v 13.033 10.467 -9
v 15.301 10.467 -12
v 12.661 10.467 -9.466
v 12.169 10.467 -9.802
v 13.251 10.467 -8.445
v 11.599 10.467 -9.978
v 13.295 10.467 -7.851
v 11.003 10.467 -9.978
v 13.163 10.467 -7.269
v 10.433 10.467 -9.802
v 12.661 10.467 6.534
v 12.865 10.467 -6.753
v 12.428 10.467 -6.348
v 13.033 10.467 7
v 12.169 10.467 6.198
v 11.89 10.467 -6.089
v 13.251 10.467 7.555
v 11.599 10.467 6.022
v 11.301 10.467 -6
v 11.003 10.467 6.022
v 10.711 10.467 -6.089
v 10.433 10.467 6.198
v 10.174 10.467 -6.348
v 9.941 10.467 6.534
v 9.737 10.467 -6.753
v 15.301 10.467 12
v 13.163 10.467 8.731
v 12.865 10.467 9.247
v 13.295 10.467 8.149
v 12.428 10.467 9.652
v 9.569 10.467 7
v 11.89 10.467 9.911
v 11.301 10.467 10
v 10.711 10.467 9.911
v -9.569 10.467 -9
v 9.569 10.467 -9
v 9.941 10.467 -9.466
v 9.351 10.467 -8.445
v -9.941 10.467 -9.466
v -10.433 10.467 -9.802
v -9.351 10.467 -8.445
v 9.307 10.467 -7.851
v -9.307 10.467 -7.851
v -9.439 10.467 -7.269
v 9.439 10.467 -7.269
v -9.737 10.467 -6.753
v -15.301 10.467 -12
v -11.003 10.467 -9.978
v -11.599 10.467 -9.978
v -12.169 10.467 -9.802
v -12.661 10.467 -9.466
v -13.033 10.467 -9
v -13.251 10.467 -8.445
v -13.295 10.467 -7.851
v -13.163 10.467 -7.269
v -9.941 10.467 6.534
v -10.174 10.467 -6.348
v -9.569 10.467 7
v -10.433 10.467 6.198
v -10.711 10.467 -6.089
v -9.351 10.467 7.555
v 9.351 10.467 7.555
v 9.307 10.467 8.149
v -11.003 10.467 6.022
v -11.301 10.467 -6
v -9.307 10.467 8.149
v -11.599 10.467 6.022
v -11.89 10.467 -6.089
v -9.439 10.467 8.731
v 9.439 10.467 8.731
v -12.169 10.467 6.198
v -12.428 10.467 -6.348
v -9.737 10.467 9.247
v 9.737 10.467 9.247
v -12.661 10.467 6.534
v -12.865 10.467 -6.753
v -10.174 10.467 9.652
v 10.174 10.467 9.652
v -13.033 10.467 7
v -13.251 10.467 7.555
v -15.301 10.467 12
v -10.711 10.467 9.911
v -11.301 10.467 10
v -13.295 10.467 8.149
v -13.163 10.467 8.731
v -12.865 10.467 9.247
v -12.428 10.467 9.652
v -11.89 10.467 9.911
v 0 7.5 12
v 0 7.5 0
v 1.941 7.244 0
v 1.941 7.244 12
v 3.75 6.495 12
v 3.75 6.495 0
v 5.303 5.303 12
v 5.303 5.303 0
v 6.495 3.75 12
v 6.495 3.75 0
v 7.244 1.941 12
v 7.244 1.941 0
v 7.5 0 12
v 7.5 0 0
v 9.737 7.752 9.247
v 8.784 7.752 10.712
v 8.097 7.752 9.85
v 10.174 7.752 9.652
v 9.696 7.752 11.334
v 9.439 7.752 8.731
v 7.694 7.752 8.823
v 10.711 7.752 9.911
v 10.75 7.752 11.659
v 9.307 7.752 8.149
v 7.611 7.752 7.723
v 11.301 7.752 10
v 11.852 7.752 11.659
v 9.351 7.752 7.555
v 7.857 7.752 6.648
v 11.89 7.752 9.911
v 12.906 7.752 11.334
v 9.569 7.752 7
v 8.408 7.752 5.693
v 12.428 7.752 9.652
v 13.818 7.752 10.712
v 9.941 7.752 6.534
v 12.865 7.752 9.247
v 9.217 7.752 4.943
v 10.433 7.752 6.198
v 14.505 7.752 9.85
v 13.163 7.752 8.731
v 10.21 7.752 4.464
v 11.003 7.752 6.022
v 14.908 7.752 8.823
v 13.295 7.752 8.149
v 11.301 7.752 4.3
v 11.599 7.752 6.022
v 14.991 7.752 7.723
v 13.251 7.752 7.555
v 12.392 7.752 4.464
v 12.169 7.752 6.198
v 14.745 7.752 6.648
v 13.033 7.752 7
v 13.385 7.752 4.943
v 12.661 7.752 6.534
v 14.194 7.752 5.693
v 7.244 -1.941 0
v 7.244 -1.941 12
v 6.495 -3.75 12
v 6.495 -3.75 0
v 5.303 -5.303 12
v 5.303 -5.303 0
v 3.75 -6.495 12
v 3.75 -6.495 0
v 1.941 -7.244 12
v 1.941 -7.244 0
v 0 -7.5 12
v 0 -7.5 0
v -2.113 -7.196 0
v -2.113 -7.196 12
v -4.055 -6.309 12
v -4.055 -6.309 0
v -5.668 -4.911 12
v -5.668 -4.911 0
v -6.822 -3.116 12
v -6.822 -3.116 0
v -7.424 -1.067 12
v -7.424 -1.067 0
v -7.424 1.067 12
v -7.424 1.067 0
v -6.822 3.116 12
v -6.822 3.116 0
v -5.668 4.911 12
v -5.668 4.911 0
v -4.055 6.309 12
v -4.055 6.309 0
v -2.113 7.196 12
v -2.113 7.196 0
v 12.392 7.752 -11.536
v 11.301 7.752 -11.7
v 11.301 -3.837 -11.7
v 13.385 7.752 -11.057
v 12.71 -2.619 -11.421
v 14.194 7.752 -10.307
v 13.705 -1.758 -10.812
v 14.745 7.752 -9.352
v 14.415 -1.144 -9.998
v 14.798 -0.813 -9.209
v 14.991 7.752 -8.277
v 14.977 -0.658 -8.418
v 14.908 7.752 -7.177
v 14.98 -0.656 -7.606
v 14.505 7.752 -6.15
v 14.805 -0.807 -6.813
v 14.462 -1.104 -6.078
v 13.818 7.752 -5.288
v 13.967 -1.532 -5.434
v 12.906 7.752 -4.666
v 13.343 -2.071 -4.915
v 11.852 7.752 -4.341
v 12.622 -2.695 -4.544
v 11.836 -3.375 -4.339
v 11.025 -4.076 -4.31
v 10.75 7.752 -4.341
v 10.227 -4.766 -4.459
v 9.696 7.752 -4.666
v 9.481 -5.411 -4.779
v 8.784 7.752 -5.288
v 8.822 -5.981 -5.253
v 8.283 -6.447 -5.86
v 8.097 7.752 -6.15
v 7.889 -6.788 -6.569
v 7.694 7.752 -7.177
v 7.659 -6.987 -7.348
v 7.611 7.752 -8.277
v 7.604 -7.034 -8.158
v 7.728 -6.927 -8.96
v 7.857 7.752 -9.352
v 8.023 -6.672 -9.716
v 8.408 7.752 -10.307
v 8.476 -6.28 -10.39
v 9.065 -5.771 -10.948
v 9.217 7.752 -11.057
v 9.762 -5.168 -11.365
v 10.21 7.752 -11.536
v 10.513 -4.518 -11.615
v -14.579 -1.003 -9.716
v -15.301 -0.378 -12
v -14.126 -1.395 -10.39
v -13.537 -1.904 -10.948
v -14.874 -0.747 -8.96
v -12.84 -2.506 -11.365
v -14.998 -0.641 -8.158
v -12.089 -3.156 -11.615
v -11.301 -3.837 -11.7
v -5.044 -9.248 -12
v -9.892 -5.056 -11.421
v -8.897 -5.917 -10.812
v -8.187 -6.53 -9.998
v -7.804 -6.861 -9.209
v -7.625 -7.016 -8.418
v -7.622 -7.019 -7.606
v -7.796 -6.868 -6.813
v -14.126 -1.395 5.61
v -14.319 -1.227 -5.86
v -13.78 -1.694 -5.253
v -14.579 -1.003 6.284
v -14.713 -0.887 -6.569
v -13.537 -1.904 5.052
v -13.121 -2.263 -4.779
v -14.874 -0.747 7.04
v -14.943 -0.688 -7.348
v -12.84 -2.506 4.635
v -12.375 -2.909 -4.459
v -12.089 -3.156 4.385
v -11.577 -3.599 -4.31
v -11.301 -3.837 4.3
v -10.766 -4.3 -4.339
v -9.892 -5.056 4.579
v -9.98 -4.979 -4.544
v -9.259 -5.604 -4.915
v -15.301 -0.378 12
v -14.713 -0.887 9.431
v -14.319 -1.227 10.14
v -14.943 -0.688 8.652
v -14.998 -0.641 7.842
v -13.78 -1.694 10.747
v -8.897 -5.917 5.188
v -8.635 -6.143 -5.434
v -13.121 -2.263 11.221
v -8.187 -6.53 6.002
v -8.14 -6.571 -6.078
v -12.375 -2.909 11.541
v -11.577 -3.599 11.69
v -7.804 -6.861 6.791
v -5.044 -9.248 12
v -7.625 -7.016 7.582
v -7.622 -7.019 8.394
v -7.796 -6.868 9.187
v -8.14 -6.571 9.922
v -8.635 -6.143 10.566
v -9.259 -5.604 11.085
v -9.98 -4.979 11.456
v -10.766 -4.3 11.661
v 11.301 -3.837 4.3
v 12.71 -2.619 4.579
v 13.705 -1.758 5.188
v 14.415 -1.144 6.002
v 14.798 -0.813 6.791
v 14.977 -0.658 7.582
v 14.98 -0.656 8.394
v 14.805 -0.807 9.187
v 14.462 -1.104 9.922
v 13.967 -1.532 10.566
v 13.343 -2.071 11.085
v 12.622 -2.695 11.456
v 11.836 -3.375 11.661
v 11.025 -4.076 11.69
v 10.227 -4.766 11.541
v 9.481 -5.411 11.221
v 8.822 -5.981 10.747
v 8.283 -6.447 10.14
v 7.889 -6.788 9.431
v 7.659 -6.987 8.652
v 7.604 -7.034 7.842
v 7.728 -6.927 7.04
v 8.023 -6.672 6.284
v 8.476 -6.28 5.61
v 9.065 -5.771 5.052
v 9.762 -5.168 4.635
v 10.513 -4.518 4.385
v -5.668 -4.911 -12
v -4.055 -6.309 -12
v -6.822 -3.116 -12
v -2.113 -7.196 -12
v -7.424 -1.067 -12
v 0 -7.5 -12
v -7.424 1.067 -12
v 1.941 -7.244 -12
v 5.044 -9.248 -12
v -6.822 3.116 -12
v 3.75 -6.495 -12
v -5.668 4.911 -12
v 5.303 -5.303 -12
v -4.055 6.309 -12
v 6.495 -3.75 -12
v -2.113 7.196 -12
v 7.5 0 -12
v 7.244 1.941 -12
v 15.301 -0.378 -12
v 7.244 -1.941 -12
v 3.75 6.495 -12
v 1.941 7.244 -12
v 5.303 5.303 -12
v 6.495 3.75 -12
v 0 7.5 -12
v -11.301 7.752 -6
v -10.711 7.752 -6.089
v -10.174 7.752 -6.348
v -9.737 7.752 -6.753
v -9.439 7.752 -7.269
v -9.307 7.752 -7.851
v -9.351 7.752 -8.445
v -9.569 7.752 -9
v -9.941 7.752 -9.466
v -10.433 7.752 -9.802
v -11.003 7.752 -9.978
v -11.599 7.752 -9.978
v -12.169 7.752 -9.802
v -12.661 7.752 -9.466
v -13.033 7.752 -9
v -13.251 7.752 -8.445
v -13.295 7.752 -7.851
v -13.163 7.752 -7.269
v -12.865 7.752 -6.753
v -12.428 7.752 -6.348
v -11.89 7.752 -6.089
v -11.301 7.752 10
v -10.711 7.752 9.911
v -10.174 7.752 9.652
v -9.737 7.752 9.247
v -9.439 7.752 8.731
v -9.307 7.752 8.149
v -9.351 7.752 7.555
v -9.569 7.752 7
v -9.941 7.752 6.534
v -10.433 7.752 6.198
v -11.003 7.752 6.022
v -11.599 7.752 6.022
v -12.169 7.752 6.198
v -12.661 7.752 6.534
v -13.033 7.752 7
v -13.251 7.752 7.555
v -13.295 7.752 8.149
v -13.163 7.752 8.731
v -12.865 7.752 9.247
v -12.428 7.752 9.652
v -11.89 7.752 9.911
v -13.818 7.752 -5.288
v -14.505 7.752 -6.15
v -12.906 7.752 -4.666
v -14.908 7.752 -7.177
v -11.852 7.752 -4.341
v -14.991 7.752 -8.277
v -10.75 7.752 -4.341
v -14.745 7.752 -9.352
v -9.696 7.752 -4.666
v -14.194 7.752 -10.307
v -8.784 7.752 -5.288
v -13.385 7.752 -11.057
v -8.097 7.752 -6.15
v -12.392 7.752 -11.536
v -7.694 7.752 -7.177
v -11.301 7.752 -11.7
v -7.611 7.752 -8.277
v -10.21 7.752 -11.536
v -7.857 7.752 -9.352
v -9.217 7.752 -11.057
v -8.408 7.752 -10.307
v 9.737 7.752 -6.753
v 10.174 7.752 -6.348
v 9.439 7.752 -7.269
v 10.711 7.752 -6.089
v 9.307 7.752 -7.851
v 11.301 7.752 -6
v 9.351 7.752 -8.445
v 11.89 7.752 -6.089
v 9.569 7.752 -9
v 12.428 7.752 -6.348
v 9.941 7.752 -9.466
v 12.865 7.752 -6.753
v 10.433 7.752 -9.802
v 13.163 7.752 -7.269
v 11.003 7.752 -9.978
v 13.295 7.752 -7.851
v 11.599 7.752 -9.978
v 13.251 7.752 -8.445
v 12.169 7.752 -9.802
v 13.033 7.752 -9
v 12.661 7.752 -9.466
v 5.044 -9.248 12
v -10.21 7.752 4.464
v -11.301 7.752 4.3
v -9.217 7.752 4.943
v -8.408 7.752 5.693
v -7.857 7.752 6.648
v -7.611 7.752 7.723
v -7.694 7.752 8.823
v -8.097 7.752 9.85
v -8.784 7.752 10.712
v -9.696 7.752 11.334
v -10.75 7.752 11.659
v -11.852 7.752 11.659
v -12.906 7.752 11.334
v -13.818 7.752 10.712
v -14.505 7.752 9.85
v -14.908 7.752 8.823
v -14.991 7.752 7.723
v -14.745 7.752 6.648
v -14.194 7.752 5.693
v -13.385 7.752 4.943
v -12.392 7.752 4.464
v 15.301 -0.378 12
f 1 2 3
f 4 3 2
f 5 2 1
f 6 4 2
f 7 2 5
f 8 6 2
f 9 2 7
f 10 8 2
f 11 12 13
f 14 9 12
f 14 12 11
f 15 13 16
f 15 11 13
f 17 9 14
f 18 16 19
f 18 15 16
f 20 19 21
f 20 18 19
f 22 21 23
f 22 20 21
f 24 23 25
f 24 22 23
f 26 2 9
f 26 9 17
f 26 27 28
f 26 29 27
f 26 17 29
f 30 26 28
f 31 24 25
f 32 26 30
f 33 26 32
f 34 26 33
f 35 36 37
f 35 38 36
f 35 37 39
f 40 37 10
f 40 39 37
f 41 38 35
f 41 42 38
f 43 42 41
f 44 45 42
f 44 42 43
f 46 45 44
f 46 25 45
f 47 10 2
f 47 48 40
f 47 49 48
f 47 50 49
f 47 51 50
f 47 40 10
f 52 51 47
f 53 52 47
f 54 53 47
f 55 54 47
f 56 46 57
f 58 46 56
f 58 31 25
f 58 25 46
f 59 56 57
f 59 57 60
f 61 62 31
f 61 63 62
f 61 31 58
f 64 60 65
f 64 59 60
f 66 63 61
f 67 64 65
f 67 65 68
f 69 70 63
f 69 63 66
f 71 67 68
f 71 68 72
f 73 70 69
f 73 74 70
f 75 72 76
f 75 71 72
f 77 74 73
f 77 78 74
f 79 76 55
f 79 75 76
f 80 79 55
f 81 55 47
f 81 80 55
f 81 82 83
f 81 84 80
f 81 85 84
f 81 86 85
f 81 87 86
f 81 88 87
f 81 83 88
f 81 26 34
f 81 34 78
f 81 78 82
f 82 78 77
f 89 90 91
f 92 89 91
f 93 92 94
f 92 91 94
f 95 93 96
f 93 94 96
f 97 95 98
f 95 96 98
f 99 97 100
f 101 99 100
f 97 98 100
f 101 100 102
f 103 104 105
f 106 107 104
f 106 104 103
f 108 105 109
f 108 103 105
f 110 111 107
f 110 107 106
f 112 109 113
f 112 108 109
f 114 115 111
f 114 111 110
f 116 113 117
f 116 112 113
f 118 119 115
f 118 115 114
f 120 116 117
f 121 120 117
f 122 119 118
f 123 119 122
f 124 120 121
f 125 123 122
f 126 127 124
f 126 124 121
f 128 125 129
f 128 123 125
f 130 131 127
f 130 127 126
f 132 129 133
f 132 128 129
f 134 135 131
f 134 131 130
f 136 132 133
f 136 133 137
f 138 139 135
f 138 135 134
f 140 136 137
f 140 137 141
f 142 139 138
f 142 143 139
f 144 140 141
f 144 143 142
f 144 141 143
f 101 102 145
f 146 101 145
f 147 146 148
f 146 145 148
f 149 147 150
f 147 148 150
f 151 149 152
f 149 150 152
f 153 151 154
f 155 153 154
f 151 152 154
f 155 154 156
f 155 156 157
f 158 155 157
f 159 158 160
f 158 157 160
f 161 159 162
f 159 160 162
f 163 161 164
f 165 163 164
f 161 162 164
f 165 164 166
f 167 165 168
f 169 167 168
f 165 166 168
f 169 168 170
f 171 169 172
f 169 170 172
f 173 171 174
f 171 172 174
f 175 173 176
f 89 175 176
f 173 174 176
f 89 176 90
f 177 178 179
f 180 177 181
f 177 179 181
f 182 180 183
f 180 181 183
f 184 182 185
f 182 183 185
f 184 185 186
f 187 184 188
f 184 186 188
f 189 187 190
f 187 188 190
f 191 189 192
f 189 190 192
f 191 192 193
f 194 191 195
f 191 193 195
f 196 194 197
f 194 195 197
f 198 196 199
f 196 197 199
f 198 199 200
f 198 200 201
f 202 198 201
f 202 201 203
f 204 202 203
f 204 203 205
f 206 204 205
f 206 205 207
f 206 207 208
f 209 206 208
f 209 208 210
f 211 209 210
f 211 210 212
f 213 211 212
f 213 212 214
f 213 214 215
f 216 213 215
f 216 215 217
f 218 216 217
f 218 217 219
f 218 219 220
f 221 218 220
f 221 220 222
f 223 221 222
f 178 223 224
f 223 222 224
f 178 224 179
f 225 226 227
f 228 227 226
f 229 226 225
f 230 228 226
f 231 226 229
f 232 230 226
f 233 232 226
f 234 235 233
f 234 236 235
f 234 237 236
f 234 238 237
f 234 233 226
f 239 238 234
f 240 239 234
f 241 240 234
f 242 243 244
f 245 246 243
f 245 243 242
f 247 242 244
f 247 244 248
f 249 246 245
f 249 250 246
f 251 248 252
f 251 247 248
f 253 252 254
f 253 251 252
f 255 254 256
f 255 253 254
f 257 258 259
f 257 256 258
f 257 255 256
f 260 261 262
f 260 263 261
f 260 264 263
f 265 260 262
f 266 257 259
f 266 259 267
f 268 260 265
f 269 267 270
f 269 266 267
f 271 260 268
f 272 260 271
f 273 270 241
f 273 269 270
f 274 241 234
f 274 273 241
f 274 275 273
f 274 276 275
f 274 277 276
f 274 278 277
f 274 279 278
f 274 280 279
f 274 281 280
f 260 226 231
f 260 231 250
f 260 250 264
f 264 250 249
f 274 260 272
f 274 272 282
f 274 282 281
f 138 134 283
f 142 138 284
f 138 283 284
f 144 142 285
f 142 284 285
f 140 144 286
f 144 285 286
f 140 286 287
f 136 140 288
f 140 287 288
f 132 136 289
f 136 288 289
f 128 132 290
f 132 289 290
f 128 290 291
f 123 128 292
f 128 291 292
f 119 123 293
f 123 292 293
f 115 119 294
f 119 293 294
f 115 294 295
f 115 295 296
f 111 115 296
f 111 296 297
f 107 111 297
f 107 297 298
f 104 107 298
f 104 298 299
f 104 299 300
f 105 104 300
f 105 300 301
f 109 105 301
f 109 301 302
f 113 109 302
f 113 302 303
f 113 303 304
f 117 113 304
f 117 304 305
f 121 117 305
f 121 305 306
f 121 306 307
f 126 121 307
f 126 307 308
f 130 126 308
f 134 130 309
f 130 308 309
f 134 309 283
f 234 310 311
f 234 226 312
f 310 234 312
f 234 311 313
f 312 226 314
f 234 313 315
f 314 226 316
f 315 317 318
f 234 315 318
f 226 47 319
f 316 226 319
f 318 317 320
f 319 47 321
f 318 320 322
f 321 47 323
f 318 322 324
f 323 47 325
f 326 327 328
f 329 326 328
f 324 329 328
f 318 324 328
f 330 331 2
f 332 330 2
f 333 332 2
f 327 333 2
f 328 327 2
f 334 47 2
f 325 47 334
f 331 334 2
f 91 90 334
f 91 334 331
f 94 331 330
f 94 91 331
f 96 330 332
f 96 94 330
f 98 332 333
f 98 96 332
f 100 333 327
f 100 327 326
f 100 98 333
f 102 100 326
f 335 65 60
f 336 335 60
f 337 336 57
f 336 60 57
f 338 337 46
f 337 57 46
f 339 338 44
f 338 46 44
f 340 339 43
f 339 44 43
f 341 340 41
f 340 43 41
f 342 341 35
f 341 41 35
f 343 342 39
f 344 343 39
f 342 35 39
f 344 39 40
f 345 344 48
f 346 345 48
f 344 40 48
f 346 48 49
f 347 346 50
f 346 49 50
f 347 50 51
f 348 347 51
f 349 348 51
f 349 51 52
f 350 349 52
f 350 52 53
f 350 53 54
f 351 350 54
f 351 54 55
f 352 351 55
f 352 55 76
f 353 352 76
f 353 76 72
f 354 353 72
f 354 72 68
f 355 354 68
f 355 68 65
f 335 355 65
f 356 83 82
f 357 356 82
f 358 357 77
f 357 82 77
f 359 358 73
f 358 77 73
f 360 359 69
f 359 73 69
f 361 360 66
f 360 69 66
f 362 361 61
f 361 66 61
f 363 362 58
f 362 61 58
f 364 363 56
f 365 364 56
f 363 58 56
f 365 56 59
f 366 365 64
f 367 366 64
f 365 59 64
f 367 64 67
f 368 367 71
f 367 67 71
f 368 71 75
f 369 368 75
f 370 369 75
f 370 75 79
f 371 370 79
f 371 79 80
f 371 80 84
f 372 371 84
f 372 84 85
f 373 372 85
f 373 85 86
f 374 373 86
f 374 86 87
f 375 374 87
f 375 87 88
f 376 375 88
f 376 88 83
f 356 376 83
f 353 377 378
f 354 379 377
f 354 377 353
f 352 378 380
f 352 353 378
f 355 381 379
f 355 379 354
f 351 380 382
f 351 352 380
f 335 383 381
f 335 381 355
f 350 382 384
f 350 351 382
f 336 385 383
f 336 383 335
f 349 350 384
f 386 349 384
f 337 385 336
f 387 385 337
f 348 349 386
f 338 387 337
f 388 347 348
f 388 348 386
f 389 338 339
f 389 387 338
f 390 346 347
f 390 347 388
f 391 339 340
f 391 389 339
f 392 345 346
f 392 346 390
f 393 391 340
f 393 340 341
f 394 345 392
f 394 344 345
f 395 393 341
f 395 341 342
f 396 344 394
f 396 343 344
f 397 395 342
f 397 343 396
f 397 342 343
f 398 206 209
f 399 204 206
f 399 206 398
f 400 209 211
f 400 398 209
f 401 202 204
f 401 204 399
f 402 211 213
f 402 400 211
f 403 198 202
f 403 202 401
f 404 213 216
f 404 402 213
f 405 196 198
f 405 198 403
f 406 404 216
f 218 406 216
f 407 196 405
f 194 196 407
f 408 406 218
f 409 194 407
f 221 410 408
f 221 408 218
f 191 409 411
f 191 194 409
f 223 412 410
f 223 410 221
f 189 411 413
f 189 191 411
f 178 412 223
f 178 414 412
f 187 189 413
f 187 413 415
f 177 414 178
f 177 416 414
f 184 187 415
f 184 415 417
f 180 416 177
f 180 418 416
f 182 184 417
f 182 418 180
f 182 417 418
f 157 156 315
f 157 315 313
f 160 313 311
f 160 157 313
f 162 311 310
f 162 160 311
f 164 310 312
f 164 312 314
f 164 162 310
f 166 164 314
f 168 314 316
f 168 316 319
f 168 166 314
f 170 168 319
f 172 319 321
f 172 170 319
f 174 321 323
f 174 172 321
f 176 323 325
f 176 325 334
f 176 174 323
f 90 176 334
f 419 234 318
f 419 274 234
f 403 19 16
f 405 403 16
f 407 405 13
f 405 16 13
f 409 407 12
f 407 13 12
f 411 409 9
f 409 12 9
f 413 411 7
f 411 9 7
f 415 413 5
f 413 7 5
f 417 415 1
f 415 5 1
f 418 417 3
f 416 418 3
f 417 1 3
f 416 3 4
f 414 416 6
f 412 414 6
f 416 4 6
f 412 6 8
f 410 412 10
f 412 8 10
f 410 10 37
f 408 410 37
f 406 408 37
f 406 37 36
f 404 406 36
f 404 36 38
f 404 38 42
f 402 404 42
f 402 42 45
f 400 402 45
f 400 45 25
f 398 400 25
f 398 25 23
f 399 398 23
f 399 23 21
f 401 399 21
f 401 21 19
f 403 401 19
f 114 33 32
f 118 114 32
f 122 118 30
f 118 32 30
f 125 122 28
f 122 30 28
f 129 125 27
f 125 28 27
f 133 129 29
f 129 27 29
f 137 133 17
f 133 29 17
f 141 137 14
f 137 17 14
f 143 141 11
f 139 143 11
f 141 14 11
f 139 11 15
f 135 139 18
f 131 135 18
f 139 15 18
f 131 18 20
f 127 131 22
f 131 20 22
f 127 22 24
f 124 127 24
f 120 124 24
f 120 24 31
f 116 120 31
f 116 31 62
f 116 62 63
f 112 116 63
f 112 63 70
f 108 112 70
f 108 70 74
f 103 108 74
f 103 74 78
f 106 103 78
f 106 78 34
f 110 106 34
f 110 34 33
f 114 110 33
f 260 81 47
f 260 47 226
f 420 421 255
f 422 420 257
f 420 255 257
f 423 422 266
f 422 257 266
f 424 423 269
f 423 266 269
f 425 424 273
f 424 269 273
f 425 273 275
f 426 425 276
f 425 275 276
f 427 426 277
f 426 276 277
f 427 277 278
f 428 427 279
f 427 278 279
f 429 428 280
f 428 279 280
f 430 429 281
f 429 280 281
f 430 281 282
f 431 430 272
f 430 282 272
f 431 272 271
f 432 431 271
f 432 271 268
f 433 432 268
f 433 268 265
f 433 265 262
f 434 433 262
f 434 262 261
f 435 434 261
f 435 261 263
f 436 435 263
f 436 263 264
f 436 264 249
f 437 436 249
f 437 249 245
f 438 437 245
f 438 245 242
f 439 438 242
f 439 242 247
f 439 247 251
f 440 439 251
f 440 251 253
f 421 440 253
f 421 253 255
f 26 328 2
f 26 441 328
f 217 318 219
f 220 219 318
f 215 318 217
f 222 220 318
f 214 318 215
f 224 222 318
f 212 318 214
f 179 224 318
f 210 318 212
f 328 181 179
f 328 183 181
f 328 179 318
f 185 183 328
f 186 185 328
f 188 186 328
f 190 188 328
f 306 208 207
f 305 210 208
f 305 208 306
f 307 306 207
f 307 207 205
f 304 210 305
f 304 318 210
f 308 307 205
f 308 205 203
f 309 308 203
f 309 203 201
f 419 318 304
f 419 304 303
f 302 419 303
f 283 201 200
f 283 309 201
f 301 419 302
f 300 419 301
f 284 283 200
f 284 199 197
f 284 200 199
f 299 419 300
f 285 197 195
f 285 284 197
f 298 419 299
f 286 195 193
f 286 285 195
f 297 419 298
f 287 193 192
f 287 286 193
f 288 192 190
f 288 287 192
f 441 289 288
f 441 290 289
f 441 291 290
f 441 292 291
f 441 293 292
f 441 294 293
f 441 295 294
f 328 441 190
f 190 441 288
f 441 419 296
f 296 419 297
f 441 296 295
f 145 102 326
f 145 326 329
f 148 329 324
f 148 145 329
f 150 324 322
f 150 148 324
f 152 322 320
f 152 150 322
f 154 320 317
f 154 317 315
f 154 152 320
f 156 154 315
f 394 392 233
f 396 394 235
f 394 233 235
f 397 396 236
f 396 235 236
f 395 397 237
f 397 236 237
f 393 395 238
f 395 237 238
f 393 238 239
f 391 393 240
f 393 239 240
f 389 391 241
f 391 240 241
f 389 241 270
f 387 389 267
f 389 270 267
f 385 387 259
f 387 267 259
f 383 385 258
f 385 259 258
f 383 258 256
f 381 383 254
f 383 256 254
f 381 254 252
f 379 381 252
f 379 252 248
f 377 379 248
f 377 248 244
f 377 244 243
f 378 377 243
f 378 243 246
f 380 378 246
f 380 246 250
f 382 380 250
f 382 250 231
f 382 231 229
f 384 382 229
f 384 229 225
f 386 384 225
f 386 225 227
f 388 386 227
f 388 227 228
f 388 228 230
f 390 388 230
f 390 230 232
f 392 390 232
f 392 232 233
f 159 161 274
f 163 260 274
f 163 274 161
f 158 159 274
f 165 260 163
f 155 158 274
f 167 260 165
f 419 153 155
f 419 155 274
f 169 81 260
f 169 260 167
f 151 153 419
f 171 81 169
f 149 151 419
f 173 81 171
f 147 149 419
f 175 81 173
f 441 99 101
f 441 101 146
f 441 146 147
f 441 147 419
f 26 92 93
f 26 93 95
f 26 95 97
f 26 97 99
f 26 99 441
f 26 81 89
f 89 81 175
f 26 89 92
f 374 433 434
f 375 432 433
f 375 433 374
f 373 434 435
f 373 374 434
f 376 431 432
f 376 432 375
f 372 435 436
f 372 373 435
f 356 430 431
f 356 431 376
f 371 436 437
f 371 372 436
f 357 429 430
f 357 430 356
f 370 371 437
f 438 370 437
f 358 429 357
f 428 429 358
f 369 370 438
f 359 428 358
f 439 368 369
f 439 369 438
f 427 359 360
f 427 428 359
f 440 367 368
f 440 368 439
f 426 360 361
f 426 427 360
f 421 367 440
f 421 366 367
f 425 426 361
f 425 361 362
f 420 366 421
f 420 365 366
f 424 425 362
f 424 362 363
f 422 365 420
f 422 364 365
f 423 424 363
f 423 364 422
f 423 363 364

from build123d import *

# Parameters (mm, degrees)
BOSS_EXTRU_1_DEPTH      = 12
ESQUISSE2_R             = 2
ENL_V_MAT_EXTRU_1_DEPTH = 28.690963204
ESQUISSE4_R             = 3.7
ENL_V_MAT_EXTRU_2_DEPTH = 17


with BuildPart() as part:
    # Esquisse1 → Boss.-Extru.1 (new, symmetric)
    with BuildSketch(Plane.XY):
        with BuildLine():
            Line((15.300968977, -0.378320662), (15.300968977, 10.466871635))
            Line((15.300968977, 10.466871635), (0, 10.466871635))
            Line((0, 10.466871635), (0, 7.5))
            ThreePointArc((0, 7.5), (5.303300859, 5.303300859), (7.5, 0))
            ThreePointArc((7.5, 0), (5.303300859, -5.303300859), (0, -7.5))
            Line((0, -7.5), (0, -9.247838393))
            Line((0, -9.247838393), (5.044275487, -9.247838393))
            Line((5.044275487, -9.247838393), (15.300968977, -0.378320662))
        make_face()
        with BuildLine():
            Line((0, 7.5), (0, 10.466871635))
            Line((0, 10.466871635), (-15.300968977, 10.466871635))
            Line((-15.300968977, 10.466871635), (-15.300968977, -0.378320662))
            Line((-15.300968977, -0.378320662), (-5.044275487, -9.247838393))
            Line((-5.044275487, -9.247838393), (0, -9.247838393))
            Line((0, -9.247838393), (0, -7.5))
            ThreePointArc((0, -7.5), (-7.5, 0), (0, 7.5))
        make_face()
    extrude(amount=BOSS_EXTRU_1_DEPTH, both=True)

    # Esquisse2 → Enlèv. mat.-Extru.1 (cut, through all)
    with BuildSketch(Plane(origin=(0, 10.466871635, 0), x_dir=(1, 0, 0), z_dir=(0, 1, 0))):
        with Locations(Location((-11.300968977, 8, 0), (0, 0, 270))):
            Circle(ESQUISSE2_R)
        with Locations(Location((-11.300968977, -8, 0), (0, 0, 270))):
            Circle(ESQUISSE2_R)
        with Locations(Location((11.300968977, -8, 0), (0, 0, 270))):
            Circle(ESQUISSE2_R)
        with Locations(Location((11.300968977, 8, 0), (0, 0, 270))):
            Circle(ESQUISSE2_R)
    extrude(amount=-ENL_V_MAT_EXTRU_1_DEPTH, mode=Mode.SUBTRACT)

    # Esquisse4 → Enlèv. mat.-Extru.2 (cut)
    with BuildSketch(Plane.XZ.offset(9.247838393)):
        with Locations(Location((-11.300968977, 8, 0), (0, 0, 270))):
            Circle(ESQUISSE4_R)
        with Locations(Location((-11.300968977, -8, 0), (0, 0, 270))):
            Circle(ESQUISSE4_R)
        with Locations(Location((11.300968977, 8, 0), (0, 0, 270))):
            Circle(ESQUISSE4_R)
        with Locations(Location((11.300968977, -8, 0), (0, 0, 270))):
            Circle(ESQUISSE4_R)
    extrude(amount=-ENL_V_MAT_EXTRU_2_DEPTH, mode=Mode.SUBTRACT)


solid = part.part
